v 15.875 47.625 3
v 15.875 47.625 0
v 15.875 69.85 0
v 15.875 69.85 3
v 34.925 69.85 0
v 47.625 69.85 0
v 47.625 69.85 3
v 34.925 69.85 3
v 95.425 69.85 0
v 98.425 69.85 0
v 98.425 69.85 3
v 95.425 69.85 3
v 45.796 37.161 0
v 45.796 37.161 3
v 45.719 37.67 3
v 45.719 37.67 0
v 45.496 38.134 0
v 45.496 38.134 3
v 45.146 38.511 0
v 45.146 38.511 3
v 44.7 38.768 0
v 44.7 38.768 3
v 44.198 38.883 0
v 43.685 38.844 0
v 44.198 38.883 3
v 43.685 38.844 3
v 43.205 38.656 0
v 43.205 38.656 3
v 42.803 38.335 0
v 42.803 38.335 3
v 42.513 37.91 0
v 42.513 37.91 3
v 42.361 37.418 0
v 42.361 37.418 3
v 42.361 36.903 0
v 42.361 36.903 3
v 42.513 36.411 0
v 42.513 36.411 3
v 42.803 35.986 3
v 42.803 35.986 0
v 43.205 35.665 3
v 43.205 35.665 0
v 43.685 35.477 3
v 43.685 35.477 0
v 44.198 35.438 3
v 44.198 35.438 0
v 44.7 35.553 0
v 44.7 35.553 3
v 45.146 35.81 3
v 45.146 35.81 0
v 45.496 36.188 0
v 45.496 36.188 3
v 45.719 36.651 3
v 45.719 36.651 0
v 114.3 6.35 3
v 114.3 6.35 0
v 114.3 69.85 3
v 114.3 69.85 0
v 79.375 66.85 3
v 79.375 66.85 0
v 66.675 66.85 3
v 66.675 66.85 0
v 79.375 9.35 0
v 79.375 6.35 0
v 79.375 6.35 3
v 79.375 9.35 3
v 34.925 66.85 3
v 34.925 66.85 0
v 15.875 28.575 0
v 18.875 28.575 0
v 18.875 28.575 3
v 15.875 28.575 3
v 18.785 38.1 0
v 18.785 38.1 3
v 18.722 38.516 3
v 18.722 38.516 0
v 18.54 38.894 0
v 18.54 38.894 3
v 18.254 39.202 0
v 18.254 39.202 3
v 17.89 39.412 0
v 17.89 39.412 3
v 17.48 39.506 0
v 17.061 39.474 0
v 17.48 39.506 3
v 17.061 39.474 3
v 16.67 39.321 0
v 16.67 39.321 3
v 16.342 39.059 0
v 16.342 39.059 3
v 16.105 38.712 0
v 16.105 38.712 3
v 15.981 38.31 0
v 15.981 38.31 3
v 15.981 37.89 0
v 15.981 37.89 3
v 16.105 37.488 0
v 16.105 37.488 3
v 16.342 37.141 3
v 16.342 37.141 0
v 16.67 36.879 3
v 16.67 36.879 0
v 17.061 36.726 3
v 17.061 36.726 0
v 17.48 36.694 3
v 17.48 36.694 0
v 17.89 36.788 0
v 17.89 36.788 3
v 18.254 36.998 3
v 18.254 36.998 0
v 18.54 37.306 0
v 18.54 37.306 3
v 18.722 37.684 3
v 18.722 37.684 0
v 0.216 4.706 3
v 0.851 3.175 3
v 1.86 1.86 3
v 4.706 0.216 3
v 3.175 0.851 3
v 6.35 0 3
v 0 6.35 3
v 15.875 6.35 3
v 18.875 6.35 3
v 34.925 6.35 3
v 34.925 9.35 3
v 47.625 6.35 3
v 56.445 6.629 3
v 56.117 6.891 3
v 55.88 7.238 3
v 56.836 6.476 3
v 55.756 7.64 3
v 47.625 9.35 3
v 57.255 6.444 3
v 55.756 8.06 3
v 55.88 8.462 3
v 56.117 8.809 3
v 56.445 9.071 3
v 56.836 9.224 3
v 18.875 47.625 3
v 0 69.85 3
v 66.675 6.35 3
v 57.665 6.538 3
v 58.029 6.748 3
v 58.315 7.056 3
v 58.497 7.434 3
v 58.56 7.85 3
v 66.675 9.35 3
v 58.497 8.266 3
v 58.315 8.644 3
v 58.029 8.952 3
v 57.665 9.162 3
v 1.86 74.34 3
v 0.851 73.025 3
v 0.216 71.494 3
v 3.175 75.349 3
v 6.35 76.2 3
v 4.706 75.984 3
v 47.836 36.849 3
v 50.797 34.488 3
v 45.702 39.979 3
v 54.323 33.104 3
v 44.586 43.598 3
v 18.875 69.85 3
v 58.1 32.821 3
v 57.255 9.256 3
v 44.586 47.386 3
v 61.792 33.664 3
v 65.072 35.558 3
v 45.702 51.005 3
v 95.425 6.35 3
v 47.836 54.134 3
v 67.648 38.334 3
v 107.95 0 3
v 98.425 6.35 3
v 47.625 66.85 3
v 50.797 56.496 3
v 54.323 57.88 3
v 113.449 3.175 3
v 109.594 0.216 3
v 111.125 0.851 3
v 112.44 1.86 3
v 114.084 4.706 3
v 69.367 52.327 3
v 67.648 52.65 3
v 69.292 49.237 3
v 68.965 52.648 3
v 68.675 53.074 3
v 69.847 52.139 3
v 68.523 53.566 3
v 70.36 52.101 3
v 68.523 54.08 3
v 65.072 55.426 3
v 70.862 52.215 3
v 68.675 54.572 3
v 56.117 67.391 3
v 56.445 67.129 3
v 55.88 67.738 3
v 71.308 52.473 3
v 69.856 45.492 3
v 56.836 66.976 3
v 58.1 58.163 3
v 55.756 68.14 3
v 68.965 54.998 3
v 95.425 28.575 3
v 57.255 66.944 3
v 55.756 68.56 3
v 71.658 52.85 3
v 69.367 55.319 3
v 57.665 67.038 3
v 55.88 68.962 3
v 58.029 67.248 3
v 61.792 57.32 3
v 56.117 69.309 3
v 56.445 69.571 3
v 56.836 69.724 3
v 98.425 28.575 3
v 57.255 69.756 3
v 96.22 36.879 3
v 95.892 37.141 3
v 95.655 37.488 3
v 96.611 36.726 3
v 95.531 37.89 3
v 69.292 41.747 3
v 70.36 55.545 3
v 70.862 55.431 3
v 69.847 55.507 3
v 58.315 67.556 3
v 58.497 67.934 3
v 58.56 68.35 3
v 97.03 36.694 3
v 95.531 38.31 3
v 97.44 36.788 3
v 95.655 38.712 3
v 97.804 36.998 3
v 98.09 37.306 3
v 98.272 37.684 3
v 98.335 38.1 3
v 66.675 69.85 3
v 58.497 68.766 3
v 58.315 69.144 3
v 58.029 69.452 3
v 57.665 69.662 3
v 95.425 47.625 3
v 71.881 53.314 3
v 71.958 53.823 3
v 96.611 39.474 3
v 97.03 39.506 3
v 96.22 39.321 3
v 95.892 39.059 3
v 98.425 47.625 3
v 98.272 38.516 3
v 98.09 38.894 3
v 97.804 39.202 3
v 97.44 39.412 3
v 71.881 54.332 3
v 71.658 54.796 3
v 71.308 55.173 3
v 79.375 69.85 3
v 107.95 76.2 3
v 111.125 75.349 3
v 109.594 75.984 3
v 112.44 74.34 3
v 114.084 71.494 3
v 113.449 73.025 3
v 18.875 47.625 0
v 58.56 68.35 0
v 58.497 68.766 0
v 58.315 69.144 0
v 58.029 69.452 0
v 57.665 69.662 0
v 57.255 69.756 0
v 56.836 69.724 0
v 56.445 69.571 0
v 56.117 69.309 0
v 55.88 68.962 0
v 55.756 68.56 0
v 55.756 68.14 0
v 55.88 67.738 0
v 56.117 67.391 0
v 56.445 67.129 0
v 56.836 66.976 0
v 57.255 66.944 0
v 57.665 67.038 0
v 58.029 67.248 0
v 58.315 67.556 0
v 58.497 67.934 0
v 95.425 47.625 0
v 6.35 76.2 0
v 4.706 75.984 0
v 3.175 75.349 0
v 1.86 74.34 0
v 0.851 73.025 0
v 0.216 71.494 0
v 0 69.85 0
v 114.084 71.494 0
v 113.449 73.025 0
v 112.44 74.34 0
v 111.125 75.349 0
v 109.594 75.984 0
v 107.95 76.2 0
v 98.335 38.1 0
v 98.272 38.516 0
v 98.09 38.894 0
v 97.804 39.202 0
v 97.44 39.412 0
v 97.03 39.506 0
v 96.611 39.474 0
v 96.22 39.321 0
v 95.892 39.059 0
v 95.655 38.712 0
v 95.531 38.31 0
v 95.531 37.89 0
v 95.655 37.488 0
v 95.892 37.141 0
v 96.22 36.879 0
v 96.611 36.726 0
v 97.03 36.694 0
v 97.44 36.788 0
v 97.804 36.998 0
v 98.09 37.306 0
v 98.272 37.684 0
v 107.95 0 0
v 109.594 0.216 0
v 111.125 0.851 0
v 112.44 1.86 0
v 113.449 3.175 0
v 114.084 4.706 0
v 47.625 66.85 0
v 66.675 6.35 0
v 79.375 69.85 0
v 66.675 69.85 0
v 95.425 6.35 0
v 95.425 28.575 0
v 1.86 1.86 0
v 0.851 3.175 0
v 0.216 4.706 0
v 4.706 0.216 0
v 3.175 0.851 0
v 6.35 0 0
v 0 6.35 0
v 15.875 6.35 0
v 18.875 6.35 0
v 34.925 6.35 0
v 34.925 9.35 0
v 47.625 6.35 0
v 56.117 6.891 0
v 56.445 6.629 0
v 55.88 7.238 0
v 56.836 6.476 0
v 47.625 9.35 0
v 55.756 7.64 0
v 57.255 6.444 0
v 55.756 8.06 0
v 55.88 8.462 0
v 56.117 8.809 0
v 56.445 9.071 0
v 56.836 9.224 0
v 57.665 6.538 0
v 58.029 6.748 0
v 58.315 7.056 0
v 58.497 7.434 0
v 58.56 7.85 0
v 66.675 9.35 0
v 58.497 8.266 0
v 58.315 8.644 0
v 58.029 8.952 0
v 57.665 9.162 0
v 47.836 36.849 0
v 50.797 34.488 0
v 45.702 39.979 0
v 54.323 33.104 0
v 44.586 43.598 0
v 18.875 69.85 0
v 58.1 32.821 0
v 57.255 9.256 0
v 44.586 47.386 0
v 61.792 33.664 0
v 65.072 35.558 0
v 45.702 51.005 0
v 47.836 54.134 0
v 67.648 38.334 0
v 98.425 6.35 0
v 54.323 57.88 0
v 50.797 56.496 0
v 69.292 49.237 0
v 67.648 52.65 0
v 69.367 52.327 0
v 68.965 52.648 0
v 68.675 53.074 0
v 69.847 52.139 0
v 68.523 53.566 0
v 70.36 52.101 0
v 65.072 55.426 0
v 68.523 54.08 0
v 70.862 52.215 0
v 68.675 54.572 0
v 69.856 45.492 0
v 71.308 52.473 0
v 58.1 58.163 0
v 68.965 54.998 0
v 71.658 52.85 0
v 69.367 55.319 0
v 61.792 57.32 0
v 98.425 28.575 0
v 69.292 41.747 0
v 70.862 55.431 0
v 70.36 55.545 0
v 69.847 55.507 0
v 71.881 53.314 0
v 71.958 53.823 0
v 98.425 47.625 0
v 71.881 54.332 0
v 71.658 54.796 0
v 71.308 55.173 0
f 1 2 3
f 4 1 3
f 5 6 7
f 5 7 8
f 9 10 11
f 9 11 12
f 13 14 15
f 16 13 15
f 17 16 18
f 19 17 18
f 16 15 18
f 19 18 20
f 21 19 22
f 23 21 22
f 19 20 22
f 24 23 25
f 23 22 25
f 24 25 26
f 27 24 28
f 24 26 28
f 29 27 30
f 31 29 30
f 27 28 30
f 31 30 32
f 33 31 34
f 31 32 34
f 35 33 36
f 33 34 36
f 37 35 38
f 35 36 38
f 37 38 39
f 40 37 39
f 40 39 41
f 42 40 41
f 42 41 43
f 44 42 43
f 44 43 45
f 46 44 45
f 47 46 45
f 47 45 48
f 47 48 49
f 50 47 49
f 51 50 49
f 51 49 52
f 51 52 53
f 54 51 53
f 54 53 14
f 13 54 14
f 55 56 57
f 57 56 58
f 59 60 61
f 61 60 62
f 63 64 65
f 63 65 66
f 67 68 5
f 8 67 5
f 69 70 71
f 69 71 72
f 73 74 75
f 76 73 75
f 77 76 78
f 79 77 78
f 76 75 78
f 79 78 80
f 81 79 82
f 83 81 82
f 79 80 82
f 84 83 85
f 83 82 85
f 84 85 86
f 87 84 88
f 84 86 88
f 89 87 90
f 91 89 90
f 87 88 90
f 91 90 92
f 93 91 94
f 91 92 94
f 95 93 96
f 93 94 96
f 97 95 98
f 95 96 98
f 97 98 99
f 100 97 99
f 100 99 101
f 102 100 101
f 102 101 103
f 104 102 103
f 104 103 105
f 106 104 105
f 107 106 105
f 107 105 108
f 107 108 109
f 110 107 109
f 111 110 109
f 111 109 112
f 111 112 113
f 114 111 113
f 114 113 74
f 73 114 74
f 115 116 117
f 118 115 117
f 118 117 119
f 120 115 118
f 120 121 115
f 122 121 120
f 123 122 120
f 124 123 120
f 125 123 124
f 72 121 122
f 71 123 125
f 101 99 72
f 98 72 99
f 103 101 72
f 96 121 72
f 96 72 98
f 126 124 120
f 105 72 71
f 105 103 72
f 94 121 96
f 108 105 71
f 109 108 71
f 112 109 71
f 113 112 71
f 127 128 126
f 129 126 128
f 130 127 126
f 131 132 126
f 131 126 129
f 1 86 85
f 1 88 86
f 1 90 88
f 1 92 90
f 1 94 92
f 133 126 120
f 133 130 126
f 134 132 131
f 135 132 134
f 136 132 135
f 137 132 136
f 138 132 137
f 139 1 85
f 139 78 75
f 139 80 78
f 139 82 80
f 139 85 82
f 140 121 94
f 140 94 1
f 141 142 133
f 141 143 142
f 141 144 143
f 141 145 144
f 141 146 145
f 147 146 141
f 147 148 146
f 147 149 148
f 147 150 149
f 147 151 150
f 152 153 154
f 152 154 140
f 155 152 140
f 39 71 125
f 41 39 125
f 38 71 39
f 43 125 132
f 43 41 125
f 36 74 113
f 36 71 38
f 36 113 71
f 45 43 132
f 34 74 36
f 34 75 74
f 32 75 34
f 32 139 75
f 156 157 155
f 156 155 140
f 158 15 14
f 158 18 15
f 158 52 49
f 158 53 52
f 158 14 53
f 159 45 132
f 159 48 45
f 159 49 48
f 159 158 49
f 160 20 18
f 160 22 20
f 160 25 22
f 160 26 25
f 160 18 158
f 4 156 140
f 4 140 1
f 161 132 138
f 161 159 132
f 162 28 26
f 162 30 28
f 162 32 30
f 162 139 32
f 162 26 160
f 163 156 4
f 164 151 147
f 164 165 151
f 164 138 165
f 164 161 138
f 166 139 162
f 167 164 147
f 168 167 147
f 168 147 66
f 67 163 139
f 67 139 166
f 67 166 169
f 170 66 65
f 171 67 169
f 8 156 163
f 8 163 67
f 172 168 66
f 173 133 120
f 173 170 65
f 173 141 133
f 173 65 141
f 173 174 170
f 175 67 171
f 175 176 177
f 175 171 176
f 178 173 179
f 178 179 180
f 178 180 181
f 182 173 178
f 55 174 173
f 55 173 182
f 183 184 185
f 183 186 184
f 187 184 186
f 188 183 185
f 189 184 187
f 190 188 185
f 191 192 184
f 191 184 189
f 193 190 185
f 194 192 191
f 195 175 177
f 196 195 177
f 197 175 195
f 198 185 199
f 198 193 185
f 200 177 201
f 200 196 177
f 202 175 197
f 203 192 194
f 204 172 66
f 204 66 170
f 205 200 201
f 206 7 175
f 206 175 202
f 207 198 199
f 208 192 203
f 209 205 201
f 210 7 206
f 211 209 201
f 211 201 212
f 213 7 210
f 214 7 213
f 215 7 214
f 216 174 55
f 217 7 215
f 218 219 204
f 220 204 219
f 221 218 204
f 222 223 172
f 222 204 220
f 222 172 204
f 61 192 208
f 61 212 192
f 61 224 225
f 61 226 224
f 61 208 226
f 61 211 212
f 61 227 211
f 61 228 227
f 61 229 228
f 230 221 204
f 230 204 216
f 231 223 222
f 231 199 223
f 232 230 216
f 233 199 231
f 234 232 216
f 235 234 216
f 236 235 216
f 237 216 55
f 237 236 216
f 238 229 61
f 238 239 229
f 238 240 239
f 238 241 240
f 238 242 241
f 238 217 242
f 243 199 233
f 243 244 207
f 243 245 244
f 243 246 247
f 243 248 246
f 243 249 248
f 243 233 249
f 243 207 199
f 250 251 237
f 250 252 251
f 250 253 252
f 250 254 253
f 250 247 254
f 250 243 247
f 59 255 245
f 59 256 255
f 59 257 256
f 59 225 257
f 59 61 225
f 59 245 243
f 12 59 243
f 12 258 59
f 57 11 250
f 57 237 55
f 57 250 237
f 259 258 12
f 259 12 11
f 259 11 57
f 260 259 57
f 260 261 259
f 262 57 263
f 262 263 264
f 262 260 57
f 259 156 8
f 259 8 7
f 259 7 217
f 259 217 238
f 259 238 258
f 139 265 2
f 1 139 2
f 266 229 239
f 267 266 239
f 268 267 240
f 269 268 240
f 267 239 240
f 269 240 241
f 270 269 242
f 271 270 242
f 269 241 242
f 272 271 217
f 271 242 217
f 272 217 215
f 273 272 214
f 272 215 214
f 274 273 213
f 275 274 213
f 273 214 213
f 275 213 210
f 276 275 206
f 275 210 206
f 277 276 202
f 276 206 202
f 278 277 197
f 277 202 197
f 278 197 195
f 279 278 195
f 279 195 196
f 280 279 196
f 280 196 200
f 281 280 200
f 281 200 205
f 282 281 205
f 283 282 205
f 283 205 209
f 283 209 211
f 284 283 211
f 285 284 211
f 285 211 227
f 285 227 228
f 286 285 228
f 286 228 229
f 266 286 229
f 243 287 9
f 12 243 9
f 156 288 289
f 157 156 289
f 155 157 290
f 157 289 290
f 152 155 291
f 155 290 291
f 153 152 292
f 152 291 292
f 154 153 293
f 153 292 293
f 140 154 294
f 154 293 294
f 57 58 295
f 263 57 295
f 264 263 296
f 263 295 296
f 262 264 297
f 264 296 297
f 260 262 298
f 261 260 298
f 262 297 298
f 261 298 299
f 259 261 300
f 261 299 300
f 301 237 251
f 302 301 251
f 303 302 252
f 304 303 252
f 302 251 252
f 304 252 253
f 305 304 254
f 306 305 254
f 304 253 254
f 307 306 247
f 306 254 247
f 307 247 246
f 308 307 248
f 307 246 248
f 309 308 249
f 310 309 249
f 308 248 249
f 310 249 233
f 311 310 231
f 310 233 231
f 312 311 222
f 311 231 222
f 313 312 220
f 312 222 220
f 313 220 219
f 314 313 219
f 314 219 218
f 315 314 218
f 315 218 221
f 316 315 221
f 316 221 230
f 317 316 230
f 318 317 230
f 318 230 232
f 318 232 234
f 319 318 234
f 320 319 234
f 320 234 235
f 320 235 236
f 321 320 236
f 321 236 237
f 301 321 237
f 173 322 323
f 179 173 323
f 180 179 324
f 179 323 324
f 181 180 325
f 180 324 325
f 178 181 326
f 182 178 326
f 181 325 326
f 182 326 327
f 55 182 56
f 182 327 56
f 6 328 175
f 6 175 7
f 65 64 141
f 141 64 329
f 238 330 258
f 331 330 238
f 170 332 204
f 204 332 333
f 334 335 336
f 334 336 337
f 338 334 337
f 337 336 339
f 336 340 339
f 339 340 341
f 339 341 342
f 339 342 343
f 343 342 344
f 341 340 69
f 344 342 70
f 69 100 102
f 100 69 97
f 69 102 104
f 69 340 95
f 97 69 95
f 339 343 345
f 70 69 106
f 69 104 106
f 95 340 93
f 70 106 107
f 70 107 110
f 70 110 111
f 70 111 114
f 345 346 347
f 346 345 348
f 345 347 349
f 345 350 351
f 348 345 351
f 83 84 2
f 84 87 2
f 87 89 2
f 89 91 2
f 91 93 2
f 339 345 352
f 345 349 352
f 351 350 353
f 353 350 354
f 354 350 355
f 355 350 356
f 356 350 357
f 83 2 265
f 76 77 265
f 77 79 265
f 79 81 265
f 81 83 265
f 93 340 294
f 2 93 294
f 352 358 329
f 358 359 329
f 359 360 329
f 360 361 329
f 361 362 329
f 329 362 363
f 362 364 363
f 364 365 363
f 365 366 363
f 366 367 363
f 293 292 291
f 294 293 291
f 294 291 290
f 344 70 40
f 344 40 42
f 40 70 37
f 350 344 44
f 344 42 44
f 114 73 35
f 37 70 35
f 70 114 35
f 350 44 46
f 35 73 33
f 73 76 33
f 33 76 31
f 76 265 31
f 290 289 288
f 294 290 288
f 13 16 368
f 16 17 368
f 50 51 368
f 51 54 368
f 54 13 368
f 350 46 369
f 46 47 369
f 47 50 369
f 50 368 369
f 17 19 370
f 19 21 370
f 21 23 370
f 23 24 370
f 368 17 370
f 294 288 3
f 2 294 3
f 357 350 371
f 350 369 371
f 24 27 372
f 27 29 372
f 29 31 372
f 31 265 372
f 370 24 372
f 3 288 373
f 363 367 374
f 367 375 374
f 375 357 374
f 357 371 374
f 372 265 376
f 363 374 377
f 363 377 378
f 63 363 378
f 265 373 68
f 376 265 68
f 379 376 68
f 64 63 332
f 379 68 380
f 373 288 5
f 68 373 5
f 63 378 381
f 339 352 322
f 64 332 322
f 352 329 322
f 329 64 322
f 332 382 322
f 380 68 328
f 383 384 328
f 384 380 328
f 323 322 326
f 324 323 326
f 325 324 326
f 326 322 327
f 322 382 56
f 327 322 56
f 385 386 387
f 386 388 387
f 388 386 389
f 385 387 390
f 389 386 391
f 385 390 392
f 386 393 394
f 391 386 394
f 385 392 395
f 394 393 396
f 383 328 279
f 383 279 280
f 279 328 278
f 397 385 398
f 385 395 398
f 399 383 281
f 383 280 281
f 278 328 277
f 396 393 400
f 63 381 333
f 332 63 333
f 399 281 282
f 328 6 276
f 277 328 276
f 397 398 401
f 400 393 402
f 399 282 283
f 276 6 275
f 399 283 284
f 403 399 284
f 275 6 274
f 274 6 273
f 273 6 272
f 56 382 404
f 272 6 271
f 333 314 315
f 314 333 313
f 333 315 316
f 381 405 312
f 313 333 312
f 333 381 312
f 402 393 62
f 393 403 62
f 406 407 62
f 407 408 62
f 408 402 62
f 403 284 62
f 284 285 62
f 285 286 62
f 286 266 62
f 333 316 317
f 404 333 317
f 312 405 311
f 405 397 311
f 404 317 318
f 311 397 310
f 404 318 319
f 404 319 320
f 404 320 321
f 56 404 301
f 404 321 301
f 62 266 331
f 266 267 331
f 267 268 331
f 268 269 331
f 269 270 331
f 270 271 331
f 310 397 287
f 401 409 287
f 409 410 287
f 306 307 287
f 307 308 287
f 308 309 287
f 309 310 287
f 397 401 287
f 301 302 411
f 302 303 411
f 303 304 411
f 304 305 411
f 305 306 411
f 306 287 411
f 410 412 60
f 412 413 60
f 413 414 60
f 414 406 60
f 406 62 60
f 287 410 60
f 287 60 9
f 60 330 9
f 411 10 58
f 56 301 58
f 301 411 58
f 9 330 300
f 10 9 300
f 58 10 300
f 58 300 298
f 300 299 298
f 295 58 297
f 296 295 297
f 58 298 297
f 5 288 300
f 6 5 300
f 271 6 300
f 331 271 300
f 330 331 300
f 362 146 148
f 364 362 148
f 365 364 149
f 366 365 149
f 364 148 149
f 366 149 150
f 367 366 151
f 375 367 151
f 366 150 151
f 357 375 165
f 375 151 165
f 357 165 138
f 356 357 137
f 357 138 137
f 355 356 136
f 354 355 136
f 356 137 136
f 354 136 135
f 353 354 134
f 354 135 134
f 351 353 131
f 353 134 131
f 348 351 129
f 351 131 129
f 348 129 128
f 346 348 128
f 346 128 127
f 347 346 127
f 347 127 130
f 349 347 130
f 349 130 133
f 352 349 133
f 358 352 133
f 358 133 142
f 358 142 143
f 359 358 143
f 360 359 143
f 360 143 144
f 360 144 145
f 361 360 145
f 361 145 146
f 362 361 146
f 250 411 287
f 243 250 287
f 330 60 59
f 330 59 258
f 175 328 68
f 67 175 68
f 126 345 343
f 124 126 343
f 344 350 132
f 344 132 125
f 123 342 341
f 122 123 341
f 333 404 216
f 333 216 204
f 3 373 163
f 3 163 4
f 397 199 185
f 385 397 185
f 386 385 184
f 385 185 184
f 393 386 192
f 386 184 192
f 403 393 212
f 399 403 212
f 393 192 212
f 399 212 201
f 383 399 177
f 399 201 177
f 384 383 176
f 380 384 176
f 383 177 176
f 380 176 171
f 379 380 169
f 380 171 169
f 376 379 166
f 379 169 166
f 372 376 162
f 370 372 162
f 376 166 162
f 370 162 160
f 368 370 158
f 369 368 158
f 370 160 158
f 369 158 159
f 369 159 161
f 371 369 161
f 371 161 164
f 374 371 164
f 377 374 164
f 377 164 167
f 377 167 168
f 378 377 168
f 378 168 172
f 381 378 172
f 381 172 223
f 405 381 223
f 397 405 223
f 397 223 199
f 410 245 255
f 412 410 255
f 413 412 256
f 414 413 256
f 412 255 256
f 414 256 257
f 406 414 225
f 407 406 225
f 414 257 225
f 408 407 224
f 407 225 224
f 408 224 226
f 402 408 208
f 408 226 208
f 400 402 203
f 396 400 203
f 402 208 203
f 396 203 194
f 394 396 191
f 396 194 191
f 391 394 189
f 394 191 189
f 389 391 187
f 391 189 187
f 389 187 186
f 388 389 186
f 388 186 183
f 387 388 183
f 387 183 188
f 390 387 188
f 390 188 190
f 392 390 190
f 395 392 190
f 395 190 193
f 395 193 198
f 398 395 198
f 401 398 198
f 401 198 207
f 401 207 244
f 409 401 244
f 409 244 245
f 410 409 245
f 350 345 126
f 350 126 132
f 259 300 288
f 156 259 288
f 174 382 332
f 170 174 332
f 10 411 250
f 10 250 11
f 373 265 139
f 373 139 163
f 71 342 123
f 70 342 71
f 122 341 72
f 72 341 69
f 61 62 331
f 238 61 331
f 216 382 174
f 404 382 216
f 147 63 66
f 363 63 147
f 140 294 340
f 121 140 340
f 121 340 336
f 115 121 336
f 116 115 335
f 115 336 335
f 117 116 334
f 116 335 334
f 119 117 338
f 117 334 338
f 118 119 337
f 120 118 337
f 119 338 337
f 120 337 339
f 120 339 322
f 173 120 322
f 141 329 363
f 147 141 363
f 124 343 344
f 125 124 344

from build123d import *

# Parameters (mm, degrees)
BOSS_EXTRUDE1_DEPTH = 3
CUT_EXTRUDE1_REACH  = 139.404
SKETCH2_W           = 12.7
SKETCH2_H           = 3
SKETCH2_W_2         = 3
SKETCH2_H_2         = 22.225
CUT_EXTRUDE3_REACH  = 139.404
SKETCH4_R           = 1.7272
SKETCH4_R_2         = 12.70635
CUT_EXTRUDE4_REACH  = 139.404
SKETCH5_R           = 1.4097


with BuildPart() as part:
    # Sketch1 → Boss-Extrude1 (new body)
    with BuildSketch(Plane.XY):
        with BuildLine():
            Line((6.35, 0), (107.95, 0))
            ThreePointArc((107.95, 0), (112.440128061, 1.859871939), (114.3, 6.35))
            Line((114.3, 6.35), (114.3, 69.85))
            ThreePointArc((114.3, 69.85), (112.440128061, 74.340128061), (107.95, 76.2))
            Line((107.95, 76.2), (6.35, 76.2))
            ThreePointArc((6.35, 76.2), (1.859871939, 74.340128061), (0, 69.85))
            Line((0, 69.85), (0, 6.35))
            ThreePointArc((0, 6.35), (1.859871939, 1.859871939), (6.35, 0))
        make_face()
    extrude(amount=BOSS_EXTRUDE1_DEPTH)

    # Sketch2 → Cut-Extrude1 (cut, up to next)
    with BuildSketch(Plane(origin=(0, 0, 0), x_dir=(-1, 0, 0), z_dir=(0, 0, -1)), mode=Mode.PRIVATE) as cut_extrude1_sk1:
        with Locations((-73.025, 68.35)):
            Rectangle(SKETCH2_W, SKETCH2_H)
    cut_extrude1_tool1 = extrude(cut_extrude1_sk1.sketch, amount=-CUT_EXTRUDE1_REACH, mode=Mode.PRIVATE) & part.part
    # Sketch2 → Cut-Extrude1 (cut, up to next)
    with BuildSketch(Plane(origin=(0, 0, 0), x_dir=(-1, 0, 0), z_dir=(0, 0, -1)), mode=Mode.PRIVATE) as cut_extrude1_sk2:
        with Locations((-41.275, 68.35)):
            Rectangle(SKETCH2_W, SKETCH2_H)
    cut_extrude1_tool2 = extrude(cut_extrude1_sk2.sketch, amount=-CUT_EXTRUDE1_REACH, mode=Mode.PRIVATE) & part.part
    # Sketch2 → Cut-Extrude1 (cut, up to next)
    with BuildSketch(Plane(origin=(0, 0, 0), x_dir=(-1, 0, 0), z_dir=(0, 0, -1)), mode=Mode.PRIVATE) as cut_extrude1_sk3:
        with Locations((-17.375, 58.7375)):
            Rectangle(SKETCH2_W_2, SKETCH2_H_2)
    cut_extrude1_tool3 = extrude(cut_extrude1_sk3.sketch, amount=-CUT_EXTRUDE1_REACH, mode=Mode.PRIVATE) & part.part
    # Sketch2 → Cut-Extrude1 (cut, up to next)
    with BuildSketch(Plane(origin=(0, 0, 0), x_dir=(-1, 0, 0), z_dir=(0, 0, -1)), mode=Mode.PRIVATE) as cut_extrude1_sk4:
        with Locations((-17.375, 17.4625)):
            Rectangle(SKETCH2_W_2, SKETCH2_H_2)
    cut_extrude1_tool4 = extrude(cut_extrude1_sk4.sketch, amount=-CUT_EXTRUDE1_REACH, mode=Mode.PRIVATE) & part.part
    # Sketch2 → Cut-Extrude1 (cut, up to next)
    with BuildSketch(Plane(origin=(0, 0, 0), x_dir=(-1, 0, 0), z_dir=(0, 0, -1)), mode=Mode.PRIVATE) as cut_extrude1_sk5:
        with Locations((-41.275, 7.85)):
            Rectangle(SKETCH2_W, SKETCH2_H)
    cut_extrude1_tool5 = extrude(cut_extrude1_sk5.sketch, amount=-CUT_EXTRUDE1_REACH, mode=Mode.PRIVATE) & part.part
    # Sketch2 → Cut-Extrude1 (cut, up to next)
    with BuildSketch(Plane(origin=(0, 0, 0), x_dir=(-1, 0, 0), z_dir=(0, 0, -1)), mode=Mode.PRIVATE) as cut_extrude1_sk6:
        with Locations((-73.025, 7.85)):
            Rectangle(SKETCH2_W, SKETCH2_H)
    cut_extrude1_tool6 = extrude(cut_extrude1_sk6.sketch, amount=-CUT_EXTRUDE1_REACH, mode=Mode.PRIVATE) & part.part
    # Sketch2 → Cut-Extrude1 (cut, up to next)
    with BuildSketch(Plane(origin=(0, 0, 0), x_dir=(-1, 0, 0), z_dir=(0, 0, -1)), mode=Mode.PRIVATE) as cut_extrude1_sk7:
        with Locations((-96.925, 17.4625)):
            Rectangle(SKETCH2_W_2, SKETCH2_H_2)
    cut_extrude1_tool7 = extrude(cut_extrude1_sk7.sketch, amount=-CUT_EXTRUDE1_REACH, mode=Mode.PRIVATE) & part.part
    # Sketch2 → Cut-Extrude1 (cut, up to next)
    with BuildSketch(Plane(origin=(0, 0, 0), x_dir=(-1, 0, 0), z_dir=(0, 0, -1)), mode=Mode.PRIVATE) as cut_extrude1_sk8:
        with Locations((-96.925, 58.7375)):
            Rectangle(SKETCH2_W_2, SKETCH2_H_2)
    cut_extrude1_tool8 = extrude(cut_extrude1_sk8.sketch, amount=-CUT_EXTRUDE1_REACH, mode=Mode.PRIVATE) & part.part
    add(cut_extrude1_tool1.solids().sort_by_distance((73.025, 68.35, 0))[0], mode=Mode.SUBTRACT)
    add(cut_extrude1_tool2.solids().sort_by_distance((41.275, 68.35, 0))[0], mode=Mode.SUBTRACT)
    add(cut_extrude1_tool3.solids().sort_by_distance((17.375, 58.7375, 0))[0], mode=Mode.SUBTRACT)
    add(cut_extrude1_tool4.solids().sort_by_distance((17.375, 17.4625, 0))[0], mode=Mode.SUBTRACT)
    add(cut_extrude1_tool5.solids().sort_by_distance((41.275, 7.85, 0))[0], mode=Mode.SUBTRACT)
    add(cut_extrude1_tool6.solids().sort_by_distance((73.025, 7.85, 0))[0], mode=Mode.SUBTRACT)
    add(cut_extrude1_tool7.solids().sort_by_distance((96.925, 17.4625, 0))[0], mode=Mode.SUBTRACT)
    add(cut_extrude1_tool8.solids().sort_by_distance((96.925, 58.7375, 0))[0], mode=Mode.SUBTRACT)

    # Sketch4 → Cut-Extrude3 (cut, up to next)
    with BuildSketch(Plane.XY.offset(3), mode=Mode.PRIVATE) as cut_extrude3_sk1:
        with Locations((70.231, 53.822979832)):
            Circle(SKETCH4_R)
    cut_extrude3_tool1 = extrude(cut_extrude3_sk1.sketch, amount=-CUT_EXTRUDE3_REACH, mode=Mode.PRIVATE) & part.part
    # Sketch4 → Cut-Extrude3 (cut, up to next)
    with BuildSketch(Plane.XY.offset(3), mode=Mode.PRIVATE) as cut_extrude3_sk2:
        with Locations((44.069, 37.160579832)):
            Circle(SKETCH4_R)
    cut_extrude3_tool2 = extrude(cut_extrude3_sk2.sketch, amount=-CUT_EXTRUDE3_REACH, mode=Mode.PRIVATE) & part.part
    # Sketch4 → Cut-Extrude3 (cut, up to next)
    with BuildSketch(Plane.XY.offset(3), mode=Mode.PRIVATE) as cut_extrude3_sk3:
        with Locations((57.15, 45.491779832)):
            Circle(SKETCH4_R_2)
    cut_extrude3_tool3 = extrude(cut_extrude3_sk3.sketch, amount=-CUT_EXTRUDE3_REACH, mode=Mode.PRIVATE) & part.part
    add(cut_extrude3_tool1.solids().sort_by_distance((70.231, 53.82298, 3))[0], mode=Mode.SUBTRACT)
    add(cut_extrude3_tool2.solids().sort_by_distance((44.069, 37.16058, 3))[0], mode=Mode.SUBTRACT)
    add(cut_extrude3_tool3.solids().sort_by_distance((57.15, 45.49178, 3))[0], mode=Mode.SUBTRACT)

    # Sketch5 → Cut-Extrude4 (cut, up to next)
    with BuildSketch(Plane.XY.offset(3), mode=Mode.PRIVATE) as cut_extrude4_sk1:
        with Locations((57.15, 68.35)):
            Circle(SKETCH5_R)
    cut_extrude4_tool1 = extrude(cut_extrude4_sk1.sketch, amount=-CUT_EXTRUDE4_REACH, mode=Mode.PRIVATE) & part.part
    # Sketch5 → Cut-Extrude4 (cut, up to next)
    with BuildSketch(Plane.XY.offset(3), mode=Mode.PRIVATE) as cut_extrude4_sk2:
        with Locations((96.925, 38.1)):
            Circle(SKETCH5_R)
    cut_extrude4_tool2 = extrude(cut_extrude4_sk2.sketch, amount=-CUT_EXTRUDE4_REACH, mode=Mode.PRIVATE) & part.part
    # Sketch5 → Cut-Extrude4 (cut, up to next)
    with BuildSketch(Plane.XY.offset(3), mode=Mode.PRIVATE) as cut_extrude4_sk3:
        with Locations((57.15, 7.85)):
            Circle(SKETCH5_R)
    cut_extrude4_tool3 = extrude(cut_extrude4_sk3.sketch, amount=-CUT_EXTRUDE4_REACH, mode=Mode.PRIVATE) & part.part
    # Sketch5 → Cut-Extrude4 (cut, up to next)
    with BuildSketch(Plane.XY.offset(3), mode=Mode.PRIVATE) as cut_extrude4_sk4:
        with Locations((17.375, 38.1)):
            Circle(SKETCH5_R)
    cut_extrude4_tool4 = extrude(cut_extrude4_sk4.sketch, amount=-CUT_EXTRUDE4_REACH, mode=Mode.PRIVATE) & part.part
    add(cut_extrude4_tool1.solids().sort_by_distance((57.15, 68.35, 3))[0], mode=Mode.SUBTRACT)
    add(cut_extrude4_tool2.solids().sort_by_distance((96.925, 38.1, 3))[0], mode=Mode.SUBTRACT)
    add(cut_extrude4_tool3.solids().sort_by_distance((57.15, 7.85, 3))[0], mode=Mode.SUBTRACT)
    add(cut_extrude4_tool4.solids().sort_by_distance((17.375, 38.1, 3))[0], mode=Mode.SUBTRACT)


solid = part.part
